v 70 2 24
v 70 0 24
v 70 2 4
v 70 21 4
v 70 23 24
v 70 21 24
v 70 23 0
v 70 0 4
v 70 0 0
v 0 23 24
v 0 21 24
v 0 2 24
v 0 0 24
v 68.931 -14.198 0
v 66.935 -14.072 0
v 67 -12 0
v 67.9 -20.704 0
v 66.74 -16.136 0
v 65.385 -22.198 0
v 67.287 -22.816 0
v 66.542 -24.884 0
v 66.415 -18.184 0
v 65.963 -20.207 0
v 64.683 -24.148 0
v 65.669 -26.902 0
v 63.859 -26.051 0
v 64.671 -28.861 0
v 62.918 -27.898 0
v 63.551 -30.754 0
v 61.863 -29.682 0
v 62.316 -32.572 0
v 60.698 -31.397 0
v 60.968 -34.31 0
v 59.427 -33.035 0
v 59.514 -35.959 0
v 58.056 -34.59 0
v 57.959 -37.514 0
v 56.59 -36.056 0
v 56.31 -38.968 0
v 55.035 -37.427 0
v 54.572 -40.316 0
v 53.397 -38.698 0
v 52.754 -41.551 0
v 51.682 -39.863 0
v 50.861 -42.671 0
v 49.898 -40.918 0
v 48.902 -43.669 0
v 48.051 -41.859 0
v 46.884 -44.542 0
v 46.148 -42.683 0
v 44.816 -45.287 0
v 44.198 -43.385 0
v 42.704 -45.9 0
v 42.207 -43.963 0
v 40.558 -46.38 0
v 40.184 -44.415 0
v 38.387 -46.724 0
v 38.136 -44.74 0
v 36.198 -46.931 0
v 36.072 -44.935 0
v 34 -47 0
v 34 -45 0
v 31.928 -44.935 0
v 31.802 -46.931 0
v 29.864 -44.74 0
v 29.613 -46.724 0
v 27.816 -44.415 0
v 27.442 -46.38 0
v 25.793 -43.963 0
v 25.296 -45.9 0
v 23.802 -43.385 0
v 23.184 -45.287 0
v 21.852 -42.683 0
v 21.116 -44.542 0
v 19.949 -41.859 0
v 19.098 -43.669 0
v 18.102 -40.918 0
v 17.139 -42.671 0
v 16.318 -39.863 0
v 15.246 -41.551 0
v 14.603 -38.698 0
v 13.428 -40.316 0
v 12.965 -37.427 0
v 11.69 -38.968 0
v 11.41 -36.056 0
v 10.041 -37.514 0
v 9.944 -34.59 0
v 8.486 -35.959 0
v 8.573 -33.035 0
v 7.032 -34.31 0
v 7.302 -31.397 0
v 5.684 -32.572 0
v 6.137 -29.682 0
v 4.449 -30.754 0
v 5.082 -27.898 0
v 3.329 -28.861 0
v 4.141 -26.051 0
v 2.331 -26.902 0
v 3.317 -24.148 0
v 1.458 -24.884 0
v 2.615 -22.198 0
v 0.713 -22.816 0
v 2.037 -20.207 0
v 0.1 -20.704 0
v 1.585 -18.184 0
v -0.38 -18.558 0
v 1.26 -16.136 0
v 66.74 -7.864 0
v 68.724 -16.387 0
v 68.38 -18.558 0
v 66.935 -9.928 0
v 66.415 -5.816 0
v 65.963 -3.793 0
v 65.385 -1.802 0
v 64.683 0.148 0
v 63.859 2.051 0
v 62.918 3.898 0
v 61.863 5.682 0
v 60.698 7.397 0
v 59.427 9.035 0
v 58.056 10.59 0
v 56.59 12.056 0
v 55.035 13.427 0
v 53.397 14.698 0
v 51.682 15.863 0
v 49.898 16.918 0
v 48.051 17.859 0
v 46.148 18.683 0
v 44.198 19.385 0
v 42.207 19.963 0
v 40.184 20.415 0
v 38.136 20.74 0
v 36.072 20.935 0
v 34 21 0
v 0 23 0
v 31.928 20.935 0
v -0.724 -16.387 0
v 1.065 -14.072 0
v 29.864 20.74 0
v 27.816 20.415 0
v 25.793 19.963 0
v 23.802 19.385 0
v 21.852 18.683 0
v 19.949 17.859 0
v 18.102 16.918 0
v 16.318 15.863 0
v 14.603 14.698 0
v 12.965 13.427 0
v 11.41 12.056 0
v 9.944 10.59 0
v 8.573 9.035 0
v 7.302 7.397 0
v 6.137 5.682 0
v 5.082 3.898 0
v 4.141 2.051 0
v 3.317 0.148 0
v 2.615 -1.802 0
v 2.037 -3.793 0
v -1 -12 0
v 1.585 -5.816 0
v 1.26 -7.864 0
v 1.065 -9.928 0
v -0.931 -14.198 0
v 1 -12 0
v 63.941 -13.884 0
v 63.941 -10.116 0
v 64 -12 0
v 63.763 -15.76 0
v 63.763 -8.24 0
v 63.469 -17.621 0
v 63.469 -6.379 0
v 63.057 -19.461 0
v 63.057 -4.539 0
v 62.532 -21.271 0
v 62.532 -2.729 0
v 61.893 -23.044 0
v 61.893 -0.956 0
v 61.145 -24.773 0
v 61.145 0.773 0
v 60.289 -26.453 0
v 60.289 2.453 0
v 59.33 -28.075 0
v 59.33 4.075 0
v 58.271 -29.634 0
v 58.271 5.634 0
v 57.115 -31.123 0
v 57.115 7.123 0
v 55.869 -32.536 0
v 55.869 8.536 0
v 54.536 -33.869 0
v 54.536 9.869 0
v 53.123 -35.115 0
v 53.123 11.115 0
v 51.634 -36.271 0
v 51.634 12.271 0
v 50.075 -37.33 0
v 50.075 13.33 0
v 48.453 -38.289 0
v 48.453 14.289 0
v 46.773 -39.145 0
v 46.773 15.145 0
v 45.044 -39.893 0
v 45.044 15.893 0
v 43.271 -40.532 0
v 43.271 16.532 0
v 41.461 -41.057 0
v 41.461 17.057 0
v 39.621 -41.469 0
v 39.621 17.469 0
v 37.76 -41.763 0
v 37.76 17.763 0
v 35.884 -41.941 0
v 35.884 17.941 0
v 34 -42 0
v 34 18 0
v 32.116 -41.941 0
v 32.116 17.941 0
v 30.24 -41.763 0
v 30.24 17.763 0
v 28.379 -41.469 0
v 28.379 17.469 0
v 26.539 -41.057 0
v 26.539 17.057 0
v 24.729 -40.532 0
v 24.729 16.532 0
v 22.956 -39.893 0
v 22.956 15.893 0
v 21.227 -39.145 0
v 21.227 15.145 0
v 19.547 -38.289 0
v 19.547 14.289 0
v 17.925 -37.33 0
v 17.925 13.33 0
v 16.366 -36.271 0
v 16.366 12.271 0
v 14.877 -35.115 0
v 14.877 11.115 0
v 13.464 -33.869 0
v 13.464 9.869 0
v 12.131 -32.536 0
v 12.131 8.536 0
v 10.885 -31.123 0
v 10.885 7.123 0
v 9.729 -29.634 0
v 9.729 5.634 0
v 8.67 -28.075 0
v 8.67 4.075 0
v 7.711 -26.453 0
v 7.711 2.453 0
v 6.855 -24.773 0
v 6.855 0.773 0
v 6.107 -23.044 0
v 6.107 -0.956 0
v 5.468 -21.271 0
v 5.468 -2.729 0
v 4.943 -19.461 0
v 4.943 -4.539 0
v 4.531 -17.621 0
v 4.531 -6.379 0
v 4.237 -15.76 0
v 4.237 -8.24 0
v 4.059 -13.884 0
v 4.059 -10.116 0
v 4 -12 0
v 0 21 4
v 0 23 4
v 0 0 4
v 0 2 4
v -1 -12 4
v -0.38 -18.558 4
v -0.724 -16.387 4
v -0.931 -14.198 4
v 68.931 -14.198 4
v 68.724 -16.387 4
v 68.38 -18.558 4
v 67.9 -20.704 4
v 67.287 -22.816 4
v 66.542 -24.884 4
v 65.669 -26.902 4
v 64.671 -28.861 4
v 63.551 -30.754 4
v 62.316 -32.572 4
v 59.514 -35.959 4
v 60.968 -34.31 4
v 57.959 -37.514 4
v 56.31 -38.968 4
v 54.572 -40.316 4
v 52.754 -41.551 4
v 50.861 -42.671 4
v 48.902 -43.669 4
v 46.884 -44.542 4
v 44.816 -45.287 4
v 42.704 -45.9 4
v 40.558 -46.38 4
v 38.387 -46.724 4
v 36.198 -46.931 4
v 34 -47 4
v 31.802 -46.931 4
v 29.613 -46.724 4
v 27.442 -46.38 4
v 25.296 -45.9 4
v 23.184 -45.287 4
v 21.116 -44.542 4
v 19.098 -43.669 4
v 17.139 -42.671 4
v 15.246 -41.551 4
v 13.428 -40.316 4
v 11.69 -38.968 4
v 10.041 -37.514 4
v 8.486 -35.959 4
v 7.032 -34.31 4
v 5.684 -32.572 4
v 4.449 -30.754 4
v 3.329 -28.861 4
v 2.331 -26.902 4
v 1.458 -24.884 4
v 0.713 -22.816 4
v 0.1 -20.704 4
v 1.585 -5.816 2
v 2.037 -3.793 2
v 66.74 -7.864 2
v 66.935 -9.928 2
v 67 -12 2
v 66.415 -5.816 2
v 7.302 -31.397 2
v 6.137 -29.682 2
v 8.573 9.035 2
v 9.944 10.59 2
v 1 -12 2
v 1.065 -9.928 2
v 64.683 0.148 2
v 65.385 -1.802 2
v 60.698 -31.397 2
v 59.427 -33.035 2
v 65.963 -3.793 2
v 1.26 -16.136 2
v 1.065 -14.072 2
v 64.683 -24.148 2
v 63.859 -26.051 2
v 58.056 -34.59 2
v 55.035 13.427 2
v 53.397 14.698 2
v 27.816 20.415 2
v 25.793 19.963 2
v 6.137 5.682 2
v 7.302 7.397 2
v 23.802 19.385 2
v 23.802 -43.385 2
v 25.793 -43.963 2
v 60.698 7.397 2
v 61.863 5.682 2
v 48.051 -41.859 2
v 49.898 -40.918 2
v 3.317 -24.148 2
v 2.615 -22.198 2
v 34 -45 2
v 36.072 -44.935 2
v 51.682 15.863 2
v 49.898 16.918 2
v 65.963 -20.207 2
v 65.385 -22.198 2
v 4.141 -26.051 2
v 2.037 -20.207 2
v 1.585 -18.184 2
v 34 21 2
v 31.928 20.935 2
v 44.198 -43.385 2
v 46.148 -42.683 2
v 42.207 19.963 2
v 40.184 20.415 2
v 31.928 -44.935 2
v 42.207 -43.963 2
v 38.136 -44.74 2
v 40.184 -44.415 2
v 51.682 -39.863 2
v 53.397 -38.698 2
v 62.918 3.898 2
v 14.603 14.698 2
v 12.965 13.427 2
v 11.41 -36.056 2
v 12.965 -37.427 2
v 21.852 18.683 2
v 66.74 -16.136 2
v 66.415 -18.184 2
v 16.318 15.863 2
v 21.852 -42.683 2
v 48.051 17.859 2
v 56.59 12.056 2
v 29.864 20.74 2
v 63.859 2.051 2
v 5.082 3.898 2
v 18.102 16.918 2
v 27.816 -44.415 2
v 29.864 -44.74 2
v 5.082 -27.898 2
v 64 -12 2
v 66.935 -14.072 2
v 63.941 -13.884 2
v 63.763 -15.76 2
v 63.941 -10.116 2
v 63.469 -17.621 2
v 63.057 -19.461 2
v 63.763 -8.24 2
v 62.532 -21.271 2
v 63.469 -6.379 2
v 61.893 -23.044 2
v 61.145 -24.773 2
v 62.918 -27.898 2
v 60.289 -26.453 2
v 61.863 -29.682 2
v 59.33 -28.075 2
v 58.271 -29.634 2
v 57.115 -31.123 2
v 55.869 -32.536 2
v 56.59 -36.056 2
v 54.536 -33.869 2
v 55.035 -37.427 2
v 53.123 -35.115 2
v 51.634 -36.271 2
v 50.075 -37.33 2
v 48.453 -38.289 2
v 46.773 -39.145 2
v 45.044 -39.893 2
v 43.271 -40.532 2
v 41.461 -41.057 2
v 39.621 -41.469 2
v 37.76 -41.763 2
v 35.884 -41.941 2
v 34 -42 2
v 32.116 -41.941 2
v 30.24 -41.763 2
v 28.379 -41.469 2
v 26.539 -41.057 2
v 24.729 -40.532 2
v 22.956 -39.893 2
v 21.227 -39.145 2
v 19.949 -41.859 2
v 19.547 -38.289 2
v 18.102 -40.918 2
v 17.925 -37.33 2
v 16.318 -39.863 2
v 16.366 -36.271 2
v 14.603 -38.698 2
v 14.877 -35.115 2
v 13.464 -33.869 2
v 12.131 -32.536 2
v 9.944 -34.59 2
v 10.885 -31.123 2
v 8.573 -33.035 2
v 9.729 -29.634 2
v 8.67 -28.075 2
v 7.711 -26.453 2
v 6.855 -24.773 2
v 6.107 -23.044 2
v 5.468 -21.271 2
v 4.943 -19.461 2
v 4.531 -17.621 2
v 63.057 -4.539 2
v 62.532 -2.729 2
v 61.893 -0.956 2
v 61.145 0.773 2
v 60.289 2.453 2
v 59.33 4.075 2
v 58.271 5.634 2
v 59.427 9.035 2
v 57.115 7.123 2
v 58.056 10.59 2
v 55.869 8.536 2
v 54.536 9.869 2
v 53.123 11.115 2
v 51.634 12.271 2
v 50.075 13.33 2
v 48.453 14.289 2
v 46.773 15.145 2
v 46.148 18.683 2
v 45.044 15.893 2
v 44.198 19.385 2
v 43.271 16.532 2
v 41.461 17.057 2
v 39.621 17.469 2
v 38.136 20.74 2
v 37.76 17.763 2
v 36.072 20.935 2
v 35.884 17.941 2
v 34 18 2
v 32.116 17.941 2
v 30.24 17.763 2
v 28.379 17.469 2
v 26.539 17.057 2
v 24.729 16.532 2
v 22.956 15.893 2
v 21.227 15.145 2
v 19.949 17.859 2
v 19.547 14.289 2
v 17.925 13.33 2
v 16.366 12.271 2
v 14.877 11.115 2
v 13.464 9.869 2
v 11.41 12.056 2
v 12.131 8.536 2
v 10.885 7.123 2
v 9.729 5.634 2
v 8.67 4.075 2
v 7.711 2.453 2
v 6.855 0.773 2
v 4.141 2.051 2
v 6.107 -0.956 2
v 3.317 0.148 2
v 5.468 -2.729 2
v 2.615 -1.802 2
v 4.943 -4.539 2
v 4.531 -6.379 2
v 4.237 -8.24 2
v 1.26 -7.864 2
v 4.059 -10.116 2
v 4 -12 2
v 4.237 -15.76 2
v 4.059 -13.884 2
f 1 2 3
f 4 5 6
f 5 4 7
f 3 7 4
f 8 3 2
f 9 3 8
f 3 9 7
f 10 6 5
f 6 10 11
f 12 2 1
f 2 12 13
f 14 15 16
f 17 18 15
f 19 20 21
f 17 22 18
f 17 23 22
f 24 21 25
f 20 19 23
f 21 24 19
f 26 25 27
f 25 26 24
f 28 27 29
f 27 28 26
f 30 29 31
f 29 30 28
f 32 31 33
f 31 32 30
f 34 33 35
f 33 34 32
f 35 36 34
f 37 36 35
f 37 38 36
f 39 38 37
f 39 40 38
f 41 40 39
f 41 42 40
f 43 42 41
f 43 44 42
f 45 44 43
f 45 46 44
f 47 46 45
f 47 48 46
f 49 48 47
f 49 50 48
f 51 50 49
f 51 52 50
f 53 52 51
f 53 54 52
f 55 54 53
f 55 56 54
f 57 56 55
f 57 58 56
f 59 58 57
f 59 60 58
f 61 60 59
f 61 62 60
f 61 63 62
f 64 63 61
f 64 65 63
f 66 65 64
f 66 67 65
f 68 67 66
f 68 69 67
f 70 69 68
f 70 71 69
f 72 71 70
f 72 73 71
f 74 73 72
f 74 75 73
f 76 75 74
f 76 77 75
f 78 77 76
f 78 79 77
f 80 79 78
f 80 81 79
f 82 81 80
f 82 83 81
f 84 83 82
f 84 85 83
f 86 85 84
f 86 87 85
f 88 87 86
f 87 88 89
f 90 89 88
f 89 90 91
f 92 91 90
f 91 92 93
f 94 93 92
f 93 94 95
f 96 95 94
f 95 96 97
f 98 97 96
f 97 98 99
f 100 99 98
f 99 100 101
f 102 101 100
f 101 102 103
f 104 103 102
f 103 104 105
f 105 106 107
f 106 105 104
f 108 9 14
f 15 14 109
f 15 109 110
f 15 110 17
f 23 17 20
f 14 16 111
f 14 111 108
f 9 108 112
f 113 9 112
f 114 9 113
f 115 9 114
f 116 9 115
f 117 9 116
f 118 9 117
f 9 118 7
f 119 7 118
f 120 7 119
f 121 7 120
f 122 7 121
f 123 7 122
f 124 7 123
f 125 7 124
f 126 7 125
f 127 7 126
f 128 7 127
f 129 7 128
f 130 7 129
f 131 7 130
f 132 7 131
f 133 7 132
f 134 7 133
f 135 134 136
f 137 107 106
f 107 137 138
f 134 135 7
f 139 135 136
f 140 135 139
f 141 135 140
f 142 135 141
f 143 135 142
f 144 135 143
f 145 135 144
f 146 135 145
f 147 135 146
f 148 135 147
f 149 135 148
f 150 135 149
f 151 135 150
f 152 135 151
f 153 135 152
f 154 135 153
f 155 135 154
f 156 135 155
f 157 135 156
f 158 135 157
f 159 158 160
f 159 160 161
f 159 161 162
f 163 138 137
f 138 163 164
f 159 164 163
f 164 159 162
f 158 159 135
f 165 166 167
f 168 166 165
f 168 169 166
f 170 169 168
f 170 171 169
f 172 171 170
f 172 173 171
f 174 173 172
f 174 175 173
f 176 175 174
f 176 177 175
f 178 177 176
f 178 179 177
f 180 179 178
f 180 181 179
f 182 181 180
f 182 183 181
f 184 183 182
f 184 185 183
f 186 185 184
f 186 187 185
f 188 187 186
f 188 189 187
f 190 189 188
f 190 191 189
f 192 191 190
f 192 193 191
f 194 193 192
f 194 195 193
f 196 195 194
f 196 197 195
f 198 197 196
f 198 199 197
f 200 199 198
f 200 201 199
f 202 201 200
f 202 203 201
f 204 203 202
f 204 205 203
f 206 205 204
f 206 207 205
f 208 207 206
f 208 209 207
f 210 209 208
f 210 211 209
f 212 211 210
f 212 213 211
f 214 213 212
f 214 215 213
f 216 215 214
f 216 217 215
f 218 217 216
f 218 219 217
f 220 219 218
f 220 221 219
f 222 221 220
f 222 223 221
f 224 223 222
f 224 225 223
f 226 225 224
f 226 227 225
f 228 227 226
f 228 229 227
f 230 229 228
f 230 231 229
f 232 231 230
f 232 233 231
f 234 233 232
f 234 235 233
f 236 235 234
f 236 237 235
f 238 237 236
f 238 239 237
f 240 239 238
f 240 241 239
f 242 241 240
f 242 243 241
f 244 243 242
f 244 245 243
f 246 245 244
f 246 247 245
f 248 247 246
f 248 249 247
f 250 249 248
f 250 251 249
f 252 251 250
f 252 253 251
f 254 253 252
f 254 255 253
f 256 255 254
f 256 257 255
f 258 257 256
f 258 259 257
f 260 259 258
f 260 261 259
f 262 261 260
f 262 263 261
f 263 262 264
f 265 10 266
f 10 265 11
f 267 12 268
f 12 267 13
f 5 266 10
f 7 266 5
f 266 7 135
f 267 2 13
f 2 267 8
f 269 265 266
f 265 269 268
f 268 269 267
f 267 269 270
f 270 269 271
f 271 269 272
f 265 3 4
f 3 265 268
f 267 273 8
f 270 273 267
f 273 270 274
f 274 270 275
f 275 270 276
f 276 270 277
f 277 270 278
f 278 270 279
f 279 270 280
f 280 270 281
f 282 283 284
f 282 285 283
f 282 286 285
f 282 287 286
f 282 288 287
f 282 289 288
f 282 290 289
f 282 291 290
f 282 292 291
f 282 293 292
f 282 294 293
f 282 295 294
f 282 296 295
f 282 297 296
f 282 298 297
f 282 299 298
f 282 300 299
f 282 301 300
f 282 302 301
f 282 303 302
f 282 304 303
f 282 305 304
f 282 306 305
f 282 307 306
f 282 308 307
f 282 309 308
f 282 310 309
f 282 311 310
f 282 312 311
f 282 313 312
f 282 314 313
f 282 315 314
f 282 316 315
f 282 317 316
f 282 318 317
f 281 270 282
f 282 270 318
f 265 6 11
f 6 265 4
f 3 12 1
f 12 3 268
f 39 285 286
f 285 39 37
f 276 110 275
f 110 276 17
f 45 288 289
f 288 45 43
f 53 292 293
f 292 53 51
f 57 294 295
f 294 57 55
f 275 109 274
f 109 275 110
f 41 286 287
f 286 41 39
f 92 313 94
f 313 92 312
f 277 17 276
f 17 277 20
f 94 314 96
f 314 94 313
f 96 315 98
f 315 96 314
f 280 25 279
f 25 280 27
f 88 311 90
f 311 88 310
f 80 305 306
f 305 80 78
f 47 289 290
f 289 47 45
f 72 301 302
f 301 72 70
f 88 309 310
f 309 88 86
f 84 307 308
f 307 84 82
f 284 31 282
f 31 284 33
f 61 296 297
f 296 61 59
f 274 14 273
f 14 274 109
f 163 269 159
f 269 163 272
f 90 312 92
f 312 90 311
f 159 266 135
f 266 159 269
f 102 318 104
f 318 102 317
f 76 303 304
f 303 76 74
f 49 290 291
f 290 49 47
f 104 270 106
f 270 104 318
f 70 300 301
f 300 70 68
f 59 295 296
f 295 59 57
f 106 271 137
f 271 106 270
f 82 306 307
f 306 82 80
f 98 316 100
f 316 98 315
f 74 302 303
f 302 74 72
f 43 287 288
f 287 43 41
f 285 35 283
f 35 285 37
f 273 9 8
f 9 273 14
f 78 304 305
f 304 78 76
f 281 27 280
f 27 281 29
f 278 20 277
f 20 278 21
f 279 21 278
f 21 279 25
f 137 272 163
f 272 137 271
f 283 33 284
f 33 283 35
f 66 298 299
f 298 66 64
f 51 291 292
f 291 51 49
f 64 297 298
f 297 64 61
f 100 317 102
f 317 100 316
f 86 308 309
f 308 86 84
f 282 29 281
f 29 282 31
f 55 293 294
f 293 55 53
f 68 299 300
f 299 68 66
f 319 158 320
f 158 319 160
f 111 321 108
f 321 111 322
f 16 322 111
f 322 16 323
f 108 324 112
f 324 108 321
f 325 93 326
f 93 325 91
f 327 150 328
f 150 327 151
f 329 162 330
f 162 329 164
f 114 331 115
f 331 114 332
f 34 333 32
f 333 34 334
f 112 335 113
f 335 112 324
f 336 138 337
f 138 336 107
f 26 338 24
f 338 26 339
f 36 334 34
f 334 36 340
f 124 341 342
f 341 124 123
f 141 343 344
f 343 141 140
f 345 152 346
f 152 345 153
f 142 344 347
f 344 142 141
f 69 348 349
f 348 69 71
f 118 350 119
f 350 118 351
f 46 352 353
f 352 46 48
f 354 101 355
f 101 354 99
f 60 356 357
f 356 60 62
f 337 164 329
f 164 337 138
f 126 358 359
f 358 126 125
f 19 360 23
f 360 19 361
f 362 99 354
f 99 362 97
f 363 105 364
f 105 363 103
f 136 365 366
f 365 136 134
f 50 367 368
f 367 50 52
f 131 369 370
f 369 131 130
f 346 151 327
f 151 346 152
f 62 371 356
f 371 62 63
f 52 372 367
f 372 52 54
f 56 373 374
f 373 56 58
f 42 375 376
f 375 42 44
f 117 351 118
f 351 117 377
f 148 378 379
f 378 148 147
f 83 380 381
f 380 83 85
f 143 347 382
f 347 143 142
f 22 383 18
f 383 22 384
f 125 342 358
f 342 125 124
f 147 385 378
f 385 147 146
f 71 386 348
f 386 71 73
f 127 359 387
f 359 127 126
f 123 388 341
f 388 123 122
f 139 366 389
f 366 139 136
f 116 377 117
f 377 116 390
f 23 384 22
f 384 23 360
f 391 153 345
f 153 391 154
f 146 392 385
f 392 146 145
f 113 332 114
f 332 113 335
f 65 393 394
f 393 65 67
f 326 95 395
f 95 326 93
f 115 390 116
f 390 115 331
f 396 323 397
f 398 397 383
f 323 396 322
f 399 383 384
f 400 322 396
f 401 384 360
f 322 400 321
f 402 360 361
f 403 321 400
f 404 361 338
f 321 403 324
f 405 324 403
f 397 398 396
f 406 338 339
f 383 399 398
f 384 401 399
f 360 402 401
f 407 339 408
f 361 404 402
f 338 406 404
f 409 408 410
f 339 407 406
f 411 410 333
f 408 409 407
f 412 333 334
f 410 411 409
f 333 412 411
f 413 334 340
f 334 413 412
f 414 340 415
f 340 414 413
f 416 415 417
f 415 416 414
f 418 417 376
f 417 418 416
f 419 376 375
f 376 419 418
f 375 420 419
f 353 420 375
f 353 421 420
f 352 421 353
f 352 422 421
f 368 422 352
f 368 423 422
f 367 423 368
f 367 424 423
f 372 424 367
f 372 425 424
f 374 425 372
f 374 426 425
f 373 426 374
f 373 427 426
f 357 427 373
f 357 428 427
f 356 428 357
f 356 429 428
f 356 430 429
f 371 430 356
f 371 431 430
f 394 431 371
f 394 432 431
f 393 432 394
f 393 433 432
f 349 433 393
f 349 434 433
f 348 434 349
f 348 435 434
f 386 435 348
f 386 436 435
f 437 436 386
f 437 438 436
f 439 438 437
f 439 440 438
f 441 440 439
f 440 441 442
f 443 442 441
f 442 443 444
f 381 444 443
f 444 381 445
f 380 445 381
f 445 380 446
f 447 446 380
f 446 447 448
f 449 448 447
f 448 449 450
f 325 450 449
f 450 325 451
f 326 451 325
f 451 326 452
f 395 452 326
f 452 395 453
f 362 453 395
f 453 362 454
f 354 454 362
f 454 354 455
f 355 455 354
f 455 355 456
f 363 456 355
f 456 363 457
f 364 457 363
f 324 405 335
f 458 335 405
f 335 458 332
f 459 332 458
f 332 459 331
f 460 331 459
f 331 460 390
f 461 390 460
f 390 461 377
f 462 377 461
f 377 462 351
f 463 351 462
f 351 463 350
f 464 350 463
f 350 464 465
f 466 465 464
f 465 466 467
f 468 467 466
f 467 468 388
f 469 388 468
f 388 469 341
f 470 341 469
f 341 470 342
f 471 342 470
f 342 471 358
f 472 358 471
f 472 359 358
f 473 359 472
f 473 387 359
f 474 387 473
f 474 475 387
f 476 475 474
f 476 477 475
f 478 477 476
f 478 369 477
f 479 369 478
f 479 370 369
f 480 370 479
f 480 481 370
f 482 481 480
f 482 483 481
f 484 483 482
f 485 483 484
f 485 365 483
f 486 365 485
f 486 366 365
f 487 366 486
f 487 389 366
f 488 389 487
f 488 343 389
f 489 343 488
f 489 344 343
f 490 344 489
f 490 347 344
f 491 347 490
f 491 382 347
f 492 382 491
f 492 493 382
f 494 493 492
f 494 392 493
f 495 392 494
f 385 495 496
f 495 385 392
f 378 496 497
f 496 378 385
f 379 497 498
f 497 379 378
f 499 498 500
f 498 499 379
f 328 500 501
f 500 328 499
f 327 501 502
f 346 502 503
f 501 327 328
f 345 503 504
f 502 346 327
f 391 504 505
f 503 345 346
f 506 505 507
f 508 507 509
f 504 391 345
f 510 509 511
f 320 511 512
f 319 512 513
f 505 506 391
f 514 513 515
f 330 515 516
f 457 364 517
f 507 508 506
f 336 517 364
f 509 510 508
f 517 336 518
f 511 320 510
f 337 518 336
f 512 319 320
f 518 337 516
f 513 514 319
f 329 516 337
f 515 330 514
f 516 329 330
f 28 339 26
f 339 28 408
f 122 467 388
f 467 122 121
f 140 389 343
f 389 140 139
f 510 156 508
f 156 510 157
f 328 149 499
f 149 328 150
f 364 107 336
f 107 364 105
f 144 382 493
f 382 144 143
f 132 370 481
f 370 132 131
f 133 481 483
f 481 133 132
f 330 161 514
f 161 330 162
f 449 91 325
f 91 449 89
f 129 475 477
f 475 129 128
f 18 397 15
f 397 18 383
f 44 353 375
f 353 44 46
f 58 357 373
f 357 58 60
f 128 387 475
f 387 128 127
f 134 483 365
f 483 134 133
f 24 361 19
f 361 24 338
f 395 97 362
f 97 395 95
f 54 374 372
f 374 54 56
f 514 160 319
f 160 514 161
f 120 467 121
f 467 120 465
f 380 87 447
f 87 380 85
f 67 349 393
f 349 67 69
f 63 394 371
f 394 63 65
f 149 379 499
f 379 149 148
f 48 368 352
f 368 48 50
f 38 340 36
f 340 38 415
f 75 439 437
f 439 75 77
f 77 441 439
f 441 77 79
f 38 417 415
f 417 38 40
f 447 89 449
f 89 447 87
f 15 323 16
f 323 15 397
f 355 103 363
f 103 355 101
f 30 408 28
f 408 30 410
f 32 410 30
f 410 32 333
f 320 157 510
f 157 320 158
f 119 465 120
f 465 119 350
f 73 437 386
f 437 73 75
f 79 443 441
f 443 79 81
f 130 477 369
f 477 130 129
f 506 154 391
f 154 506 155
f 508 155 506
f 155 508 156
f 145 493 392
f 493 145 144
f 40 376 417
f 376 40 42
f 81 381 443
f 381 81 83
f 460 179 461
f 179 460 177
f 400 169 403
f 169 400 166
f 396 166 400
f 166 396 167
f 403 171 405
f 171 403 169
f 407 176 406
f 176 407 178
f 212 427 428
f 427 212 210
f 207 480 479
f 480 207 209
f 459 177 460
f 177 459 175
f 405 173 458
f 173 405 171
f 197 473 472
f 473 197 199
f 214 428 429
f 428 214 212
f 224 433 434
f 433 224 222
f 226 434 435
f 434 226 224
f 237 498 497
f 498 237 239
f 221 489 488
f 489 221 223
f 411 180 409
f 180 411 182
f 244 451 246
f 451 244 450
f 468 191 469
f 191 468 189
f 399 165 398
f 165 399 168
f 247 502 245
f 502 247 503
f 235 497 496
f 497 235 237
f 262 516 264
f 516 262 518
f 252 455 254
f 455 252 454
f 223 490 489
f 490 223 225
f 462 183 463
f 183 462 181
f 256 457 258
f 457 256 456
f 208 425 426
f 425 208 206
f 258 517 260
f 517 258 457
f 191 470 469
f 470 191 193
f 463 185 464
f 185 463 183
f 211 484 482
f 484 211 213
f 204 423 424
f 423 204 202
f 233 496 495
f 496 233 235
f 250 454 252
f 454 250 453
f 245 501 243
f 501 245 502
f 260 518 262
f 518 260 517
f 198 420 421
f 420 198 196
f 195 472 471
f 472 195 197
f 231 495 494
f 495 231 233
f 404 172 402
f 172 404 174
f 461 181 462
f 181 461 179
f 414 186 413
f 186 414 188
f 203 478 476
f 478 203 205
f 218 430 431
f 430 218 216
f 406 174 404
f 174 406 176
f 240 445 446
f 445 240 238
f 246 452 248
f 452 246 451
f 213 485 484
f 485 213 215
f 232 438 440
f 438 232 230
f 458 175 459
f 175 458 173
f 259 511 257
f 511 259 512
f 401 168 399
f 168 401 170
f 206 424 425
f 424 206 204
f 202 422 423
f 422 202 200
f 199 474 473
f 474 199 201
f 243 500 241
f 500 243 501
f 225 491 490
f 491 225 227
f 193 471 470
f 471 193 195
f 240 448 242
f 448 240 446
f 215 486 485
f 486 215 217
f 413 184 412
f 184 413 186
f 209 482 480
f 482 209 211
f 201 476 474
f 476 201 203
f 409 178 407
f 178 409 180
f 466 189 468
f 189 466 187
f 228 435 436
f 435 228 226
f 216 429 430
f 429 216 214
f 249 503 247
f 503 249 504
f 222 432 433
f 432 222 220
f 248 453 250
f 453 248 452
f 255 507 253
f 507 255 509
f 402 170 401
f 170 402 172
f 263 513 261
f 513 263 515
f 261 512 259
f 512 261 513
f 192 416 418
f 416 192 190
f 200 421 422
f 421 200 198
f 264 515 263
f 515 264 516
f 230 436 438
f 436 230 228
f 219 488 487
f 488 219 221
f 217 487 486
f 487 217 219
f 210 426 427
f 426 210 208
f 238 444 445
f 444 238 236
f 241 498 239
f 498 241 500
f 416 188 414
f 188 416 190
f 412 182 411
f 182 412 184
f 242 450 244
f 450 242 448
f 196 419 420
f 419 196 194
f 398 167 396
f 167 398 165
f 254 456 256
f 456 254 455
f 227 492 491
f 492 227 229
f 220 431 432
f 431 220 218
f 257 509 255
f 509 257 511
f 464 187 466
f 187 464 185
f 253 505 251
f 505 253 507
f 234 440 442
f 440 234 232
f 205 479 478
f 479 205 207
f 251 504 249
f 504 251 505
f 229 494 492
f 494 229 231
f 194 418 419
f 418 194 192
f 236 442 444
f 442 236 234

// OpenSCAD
$fn=100;

difference()
{
  union()
  {
    hull()
    {
      cube([64+2*3, 19+2*2, 4]);
      translate([(64+2*2)/2, -12, 0])
        cylinder(r=(64+2*3)/2, h=2+2);
    }
    difference()
    {
      cube([64+2*3, 19+2*2, 20+4]);
      translate([-1, 2, 4])
        cube([64+2*4, 19, 20+1]);
    }
  }
  translate([(64+2*2)/2, -12, -1])
    difference()
    {
      cylinder(r=(64+2)/2, h=2+1);
      cylinder(r=(62-2)/2, h=2+1);
    }
}
